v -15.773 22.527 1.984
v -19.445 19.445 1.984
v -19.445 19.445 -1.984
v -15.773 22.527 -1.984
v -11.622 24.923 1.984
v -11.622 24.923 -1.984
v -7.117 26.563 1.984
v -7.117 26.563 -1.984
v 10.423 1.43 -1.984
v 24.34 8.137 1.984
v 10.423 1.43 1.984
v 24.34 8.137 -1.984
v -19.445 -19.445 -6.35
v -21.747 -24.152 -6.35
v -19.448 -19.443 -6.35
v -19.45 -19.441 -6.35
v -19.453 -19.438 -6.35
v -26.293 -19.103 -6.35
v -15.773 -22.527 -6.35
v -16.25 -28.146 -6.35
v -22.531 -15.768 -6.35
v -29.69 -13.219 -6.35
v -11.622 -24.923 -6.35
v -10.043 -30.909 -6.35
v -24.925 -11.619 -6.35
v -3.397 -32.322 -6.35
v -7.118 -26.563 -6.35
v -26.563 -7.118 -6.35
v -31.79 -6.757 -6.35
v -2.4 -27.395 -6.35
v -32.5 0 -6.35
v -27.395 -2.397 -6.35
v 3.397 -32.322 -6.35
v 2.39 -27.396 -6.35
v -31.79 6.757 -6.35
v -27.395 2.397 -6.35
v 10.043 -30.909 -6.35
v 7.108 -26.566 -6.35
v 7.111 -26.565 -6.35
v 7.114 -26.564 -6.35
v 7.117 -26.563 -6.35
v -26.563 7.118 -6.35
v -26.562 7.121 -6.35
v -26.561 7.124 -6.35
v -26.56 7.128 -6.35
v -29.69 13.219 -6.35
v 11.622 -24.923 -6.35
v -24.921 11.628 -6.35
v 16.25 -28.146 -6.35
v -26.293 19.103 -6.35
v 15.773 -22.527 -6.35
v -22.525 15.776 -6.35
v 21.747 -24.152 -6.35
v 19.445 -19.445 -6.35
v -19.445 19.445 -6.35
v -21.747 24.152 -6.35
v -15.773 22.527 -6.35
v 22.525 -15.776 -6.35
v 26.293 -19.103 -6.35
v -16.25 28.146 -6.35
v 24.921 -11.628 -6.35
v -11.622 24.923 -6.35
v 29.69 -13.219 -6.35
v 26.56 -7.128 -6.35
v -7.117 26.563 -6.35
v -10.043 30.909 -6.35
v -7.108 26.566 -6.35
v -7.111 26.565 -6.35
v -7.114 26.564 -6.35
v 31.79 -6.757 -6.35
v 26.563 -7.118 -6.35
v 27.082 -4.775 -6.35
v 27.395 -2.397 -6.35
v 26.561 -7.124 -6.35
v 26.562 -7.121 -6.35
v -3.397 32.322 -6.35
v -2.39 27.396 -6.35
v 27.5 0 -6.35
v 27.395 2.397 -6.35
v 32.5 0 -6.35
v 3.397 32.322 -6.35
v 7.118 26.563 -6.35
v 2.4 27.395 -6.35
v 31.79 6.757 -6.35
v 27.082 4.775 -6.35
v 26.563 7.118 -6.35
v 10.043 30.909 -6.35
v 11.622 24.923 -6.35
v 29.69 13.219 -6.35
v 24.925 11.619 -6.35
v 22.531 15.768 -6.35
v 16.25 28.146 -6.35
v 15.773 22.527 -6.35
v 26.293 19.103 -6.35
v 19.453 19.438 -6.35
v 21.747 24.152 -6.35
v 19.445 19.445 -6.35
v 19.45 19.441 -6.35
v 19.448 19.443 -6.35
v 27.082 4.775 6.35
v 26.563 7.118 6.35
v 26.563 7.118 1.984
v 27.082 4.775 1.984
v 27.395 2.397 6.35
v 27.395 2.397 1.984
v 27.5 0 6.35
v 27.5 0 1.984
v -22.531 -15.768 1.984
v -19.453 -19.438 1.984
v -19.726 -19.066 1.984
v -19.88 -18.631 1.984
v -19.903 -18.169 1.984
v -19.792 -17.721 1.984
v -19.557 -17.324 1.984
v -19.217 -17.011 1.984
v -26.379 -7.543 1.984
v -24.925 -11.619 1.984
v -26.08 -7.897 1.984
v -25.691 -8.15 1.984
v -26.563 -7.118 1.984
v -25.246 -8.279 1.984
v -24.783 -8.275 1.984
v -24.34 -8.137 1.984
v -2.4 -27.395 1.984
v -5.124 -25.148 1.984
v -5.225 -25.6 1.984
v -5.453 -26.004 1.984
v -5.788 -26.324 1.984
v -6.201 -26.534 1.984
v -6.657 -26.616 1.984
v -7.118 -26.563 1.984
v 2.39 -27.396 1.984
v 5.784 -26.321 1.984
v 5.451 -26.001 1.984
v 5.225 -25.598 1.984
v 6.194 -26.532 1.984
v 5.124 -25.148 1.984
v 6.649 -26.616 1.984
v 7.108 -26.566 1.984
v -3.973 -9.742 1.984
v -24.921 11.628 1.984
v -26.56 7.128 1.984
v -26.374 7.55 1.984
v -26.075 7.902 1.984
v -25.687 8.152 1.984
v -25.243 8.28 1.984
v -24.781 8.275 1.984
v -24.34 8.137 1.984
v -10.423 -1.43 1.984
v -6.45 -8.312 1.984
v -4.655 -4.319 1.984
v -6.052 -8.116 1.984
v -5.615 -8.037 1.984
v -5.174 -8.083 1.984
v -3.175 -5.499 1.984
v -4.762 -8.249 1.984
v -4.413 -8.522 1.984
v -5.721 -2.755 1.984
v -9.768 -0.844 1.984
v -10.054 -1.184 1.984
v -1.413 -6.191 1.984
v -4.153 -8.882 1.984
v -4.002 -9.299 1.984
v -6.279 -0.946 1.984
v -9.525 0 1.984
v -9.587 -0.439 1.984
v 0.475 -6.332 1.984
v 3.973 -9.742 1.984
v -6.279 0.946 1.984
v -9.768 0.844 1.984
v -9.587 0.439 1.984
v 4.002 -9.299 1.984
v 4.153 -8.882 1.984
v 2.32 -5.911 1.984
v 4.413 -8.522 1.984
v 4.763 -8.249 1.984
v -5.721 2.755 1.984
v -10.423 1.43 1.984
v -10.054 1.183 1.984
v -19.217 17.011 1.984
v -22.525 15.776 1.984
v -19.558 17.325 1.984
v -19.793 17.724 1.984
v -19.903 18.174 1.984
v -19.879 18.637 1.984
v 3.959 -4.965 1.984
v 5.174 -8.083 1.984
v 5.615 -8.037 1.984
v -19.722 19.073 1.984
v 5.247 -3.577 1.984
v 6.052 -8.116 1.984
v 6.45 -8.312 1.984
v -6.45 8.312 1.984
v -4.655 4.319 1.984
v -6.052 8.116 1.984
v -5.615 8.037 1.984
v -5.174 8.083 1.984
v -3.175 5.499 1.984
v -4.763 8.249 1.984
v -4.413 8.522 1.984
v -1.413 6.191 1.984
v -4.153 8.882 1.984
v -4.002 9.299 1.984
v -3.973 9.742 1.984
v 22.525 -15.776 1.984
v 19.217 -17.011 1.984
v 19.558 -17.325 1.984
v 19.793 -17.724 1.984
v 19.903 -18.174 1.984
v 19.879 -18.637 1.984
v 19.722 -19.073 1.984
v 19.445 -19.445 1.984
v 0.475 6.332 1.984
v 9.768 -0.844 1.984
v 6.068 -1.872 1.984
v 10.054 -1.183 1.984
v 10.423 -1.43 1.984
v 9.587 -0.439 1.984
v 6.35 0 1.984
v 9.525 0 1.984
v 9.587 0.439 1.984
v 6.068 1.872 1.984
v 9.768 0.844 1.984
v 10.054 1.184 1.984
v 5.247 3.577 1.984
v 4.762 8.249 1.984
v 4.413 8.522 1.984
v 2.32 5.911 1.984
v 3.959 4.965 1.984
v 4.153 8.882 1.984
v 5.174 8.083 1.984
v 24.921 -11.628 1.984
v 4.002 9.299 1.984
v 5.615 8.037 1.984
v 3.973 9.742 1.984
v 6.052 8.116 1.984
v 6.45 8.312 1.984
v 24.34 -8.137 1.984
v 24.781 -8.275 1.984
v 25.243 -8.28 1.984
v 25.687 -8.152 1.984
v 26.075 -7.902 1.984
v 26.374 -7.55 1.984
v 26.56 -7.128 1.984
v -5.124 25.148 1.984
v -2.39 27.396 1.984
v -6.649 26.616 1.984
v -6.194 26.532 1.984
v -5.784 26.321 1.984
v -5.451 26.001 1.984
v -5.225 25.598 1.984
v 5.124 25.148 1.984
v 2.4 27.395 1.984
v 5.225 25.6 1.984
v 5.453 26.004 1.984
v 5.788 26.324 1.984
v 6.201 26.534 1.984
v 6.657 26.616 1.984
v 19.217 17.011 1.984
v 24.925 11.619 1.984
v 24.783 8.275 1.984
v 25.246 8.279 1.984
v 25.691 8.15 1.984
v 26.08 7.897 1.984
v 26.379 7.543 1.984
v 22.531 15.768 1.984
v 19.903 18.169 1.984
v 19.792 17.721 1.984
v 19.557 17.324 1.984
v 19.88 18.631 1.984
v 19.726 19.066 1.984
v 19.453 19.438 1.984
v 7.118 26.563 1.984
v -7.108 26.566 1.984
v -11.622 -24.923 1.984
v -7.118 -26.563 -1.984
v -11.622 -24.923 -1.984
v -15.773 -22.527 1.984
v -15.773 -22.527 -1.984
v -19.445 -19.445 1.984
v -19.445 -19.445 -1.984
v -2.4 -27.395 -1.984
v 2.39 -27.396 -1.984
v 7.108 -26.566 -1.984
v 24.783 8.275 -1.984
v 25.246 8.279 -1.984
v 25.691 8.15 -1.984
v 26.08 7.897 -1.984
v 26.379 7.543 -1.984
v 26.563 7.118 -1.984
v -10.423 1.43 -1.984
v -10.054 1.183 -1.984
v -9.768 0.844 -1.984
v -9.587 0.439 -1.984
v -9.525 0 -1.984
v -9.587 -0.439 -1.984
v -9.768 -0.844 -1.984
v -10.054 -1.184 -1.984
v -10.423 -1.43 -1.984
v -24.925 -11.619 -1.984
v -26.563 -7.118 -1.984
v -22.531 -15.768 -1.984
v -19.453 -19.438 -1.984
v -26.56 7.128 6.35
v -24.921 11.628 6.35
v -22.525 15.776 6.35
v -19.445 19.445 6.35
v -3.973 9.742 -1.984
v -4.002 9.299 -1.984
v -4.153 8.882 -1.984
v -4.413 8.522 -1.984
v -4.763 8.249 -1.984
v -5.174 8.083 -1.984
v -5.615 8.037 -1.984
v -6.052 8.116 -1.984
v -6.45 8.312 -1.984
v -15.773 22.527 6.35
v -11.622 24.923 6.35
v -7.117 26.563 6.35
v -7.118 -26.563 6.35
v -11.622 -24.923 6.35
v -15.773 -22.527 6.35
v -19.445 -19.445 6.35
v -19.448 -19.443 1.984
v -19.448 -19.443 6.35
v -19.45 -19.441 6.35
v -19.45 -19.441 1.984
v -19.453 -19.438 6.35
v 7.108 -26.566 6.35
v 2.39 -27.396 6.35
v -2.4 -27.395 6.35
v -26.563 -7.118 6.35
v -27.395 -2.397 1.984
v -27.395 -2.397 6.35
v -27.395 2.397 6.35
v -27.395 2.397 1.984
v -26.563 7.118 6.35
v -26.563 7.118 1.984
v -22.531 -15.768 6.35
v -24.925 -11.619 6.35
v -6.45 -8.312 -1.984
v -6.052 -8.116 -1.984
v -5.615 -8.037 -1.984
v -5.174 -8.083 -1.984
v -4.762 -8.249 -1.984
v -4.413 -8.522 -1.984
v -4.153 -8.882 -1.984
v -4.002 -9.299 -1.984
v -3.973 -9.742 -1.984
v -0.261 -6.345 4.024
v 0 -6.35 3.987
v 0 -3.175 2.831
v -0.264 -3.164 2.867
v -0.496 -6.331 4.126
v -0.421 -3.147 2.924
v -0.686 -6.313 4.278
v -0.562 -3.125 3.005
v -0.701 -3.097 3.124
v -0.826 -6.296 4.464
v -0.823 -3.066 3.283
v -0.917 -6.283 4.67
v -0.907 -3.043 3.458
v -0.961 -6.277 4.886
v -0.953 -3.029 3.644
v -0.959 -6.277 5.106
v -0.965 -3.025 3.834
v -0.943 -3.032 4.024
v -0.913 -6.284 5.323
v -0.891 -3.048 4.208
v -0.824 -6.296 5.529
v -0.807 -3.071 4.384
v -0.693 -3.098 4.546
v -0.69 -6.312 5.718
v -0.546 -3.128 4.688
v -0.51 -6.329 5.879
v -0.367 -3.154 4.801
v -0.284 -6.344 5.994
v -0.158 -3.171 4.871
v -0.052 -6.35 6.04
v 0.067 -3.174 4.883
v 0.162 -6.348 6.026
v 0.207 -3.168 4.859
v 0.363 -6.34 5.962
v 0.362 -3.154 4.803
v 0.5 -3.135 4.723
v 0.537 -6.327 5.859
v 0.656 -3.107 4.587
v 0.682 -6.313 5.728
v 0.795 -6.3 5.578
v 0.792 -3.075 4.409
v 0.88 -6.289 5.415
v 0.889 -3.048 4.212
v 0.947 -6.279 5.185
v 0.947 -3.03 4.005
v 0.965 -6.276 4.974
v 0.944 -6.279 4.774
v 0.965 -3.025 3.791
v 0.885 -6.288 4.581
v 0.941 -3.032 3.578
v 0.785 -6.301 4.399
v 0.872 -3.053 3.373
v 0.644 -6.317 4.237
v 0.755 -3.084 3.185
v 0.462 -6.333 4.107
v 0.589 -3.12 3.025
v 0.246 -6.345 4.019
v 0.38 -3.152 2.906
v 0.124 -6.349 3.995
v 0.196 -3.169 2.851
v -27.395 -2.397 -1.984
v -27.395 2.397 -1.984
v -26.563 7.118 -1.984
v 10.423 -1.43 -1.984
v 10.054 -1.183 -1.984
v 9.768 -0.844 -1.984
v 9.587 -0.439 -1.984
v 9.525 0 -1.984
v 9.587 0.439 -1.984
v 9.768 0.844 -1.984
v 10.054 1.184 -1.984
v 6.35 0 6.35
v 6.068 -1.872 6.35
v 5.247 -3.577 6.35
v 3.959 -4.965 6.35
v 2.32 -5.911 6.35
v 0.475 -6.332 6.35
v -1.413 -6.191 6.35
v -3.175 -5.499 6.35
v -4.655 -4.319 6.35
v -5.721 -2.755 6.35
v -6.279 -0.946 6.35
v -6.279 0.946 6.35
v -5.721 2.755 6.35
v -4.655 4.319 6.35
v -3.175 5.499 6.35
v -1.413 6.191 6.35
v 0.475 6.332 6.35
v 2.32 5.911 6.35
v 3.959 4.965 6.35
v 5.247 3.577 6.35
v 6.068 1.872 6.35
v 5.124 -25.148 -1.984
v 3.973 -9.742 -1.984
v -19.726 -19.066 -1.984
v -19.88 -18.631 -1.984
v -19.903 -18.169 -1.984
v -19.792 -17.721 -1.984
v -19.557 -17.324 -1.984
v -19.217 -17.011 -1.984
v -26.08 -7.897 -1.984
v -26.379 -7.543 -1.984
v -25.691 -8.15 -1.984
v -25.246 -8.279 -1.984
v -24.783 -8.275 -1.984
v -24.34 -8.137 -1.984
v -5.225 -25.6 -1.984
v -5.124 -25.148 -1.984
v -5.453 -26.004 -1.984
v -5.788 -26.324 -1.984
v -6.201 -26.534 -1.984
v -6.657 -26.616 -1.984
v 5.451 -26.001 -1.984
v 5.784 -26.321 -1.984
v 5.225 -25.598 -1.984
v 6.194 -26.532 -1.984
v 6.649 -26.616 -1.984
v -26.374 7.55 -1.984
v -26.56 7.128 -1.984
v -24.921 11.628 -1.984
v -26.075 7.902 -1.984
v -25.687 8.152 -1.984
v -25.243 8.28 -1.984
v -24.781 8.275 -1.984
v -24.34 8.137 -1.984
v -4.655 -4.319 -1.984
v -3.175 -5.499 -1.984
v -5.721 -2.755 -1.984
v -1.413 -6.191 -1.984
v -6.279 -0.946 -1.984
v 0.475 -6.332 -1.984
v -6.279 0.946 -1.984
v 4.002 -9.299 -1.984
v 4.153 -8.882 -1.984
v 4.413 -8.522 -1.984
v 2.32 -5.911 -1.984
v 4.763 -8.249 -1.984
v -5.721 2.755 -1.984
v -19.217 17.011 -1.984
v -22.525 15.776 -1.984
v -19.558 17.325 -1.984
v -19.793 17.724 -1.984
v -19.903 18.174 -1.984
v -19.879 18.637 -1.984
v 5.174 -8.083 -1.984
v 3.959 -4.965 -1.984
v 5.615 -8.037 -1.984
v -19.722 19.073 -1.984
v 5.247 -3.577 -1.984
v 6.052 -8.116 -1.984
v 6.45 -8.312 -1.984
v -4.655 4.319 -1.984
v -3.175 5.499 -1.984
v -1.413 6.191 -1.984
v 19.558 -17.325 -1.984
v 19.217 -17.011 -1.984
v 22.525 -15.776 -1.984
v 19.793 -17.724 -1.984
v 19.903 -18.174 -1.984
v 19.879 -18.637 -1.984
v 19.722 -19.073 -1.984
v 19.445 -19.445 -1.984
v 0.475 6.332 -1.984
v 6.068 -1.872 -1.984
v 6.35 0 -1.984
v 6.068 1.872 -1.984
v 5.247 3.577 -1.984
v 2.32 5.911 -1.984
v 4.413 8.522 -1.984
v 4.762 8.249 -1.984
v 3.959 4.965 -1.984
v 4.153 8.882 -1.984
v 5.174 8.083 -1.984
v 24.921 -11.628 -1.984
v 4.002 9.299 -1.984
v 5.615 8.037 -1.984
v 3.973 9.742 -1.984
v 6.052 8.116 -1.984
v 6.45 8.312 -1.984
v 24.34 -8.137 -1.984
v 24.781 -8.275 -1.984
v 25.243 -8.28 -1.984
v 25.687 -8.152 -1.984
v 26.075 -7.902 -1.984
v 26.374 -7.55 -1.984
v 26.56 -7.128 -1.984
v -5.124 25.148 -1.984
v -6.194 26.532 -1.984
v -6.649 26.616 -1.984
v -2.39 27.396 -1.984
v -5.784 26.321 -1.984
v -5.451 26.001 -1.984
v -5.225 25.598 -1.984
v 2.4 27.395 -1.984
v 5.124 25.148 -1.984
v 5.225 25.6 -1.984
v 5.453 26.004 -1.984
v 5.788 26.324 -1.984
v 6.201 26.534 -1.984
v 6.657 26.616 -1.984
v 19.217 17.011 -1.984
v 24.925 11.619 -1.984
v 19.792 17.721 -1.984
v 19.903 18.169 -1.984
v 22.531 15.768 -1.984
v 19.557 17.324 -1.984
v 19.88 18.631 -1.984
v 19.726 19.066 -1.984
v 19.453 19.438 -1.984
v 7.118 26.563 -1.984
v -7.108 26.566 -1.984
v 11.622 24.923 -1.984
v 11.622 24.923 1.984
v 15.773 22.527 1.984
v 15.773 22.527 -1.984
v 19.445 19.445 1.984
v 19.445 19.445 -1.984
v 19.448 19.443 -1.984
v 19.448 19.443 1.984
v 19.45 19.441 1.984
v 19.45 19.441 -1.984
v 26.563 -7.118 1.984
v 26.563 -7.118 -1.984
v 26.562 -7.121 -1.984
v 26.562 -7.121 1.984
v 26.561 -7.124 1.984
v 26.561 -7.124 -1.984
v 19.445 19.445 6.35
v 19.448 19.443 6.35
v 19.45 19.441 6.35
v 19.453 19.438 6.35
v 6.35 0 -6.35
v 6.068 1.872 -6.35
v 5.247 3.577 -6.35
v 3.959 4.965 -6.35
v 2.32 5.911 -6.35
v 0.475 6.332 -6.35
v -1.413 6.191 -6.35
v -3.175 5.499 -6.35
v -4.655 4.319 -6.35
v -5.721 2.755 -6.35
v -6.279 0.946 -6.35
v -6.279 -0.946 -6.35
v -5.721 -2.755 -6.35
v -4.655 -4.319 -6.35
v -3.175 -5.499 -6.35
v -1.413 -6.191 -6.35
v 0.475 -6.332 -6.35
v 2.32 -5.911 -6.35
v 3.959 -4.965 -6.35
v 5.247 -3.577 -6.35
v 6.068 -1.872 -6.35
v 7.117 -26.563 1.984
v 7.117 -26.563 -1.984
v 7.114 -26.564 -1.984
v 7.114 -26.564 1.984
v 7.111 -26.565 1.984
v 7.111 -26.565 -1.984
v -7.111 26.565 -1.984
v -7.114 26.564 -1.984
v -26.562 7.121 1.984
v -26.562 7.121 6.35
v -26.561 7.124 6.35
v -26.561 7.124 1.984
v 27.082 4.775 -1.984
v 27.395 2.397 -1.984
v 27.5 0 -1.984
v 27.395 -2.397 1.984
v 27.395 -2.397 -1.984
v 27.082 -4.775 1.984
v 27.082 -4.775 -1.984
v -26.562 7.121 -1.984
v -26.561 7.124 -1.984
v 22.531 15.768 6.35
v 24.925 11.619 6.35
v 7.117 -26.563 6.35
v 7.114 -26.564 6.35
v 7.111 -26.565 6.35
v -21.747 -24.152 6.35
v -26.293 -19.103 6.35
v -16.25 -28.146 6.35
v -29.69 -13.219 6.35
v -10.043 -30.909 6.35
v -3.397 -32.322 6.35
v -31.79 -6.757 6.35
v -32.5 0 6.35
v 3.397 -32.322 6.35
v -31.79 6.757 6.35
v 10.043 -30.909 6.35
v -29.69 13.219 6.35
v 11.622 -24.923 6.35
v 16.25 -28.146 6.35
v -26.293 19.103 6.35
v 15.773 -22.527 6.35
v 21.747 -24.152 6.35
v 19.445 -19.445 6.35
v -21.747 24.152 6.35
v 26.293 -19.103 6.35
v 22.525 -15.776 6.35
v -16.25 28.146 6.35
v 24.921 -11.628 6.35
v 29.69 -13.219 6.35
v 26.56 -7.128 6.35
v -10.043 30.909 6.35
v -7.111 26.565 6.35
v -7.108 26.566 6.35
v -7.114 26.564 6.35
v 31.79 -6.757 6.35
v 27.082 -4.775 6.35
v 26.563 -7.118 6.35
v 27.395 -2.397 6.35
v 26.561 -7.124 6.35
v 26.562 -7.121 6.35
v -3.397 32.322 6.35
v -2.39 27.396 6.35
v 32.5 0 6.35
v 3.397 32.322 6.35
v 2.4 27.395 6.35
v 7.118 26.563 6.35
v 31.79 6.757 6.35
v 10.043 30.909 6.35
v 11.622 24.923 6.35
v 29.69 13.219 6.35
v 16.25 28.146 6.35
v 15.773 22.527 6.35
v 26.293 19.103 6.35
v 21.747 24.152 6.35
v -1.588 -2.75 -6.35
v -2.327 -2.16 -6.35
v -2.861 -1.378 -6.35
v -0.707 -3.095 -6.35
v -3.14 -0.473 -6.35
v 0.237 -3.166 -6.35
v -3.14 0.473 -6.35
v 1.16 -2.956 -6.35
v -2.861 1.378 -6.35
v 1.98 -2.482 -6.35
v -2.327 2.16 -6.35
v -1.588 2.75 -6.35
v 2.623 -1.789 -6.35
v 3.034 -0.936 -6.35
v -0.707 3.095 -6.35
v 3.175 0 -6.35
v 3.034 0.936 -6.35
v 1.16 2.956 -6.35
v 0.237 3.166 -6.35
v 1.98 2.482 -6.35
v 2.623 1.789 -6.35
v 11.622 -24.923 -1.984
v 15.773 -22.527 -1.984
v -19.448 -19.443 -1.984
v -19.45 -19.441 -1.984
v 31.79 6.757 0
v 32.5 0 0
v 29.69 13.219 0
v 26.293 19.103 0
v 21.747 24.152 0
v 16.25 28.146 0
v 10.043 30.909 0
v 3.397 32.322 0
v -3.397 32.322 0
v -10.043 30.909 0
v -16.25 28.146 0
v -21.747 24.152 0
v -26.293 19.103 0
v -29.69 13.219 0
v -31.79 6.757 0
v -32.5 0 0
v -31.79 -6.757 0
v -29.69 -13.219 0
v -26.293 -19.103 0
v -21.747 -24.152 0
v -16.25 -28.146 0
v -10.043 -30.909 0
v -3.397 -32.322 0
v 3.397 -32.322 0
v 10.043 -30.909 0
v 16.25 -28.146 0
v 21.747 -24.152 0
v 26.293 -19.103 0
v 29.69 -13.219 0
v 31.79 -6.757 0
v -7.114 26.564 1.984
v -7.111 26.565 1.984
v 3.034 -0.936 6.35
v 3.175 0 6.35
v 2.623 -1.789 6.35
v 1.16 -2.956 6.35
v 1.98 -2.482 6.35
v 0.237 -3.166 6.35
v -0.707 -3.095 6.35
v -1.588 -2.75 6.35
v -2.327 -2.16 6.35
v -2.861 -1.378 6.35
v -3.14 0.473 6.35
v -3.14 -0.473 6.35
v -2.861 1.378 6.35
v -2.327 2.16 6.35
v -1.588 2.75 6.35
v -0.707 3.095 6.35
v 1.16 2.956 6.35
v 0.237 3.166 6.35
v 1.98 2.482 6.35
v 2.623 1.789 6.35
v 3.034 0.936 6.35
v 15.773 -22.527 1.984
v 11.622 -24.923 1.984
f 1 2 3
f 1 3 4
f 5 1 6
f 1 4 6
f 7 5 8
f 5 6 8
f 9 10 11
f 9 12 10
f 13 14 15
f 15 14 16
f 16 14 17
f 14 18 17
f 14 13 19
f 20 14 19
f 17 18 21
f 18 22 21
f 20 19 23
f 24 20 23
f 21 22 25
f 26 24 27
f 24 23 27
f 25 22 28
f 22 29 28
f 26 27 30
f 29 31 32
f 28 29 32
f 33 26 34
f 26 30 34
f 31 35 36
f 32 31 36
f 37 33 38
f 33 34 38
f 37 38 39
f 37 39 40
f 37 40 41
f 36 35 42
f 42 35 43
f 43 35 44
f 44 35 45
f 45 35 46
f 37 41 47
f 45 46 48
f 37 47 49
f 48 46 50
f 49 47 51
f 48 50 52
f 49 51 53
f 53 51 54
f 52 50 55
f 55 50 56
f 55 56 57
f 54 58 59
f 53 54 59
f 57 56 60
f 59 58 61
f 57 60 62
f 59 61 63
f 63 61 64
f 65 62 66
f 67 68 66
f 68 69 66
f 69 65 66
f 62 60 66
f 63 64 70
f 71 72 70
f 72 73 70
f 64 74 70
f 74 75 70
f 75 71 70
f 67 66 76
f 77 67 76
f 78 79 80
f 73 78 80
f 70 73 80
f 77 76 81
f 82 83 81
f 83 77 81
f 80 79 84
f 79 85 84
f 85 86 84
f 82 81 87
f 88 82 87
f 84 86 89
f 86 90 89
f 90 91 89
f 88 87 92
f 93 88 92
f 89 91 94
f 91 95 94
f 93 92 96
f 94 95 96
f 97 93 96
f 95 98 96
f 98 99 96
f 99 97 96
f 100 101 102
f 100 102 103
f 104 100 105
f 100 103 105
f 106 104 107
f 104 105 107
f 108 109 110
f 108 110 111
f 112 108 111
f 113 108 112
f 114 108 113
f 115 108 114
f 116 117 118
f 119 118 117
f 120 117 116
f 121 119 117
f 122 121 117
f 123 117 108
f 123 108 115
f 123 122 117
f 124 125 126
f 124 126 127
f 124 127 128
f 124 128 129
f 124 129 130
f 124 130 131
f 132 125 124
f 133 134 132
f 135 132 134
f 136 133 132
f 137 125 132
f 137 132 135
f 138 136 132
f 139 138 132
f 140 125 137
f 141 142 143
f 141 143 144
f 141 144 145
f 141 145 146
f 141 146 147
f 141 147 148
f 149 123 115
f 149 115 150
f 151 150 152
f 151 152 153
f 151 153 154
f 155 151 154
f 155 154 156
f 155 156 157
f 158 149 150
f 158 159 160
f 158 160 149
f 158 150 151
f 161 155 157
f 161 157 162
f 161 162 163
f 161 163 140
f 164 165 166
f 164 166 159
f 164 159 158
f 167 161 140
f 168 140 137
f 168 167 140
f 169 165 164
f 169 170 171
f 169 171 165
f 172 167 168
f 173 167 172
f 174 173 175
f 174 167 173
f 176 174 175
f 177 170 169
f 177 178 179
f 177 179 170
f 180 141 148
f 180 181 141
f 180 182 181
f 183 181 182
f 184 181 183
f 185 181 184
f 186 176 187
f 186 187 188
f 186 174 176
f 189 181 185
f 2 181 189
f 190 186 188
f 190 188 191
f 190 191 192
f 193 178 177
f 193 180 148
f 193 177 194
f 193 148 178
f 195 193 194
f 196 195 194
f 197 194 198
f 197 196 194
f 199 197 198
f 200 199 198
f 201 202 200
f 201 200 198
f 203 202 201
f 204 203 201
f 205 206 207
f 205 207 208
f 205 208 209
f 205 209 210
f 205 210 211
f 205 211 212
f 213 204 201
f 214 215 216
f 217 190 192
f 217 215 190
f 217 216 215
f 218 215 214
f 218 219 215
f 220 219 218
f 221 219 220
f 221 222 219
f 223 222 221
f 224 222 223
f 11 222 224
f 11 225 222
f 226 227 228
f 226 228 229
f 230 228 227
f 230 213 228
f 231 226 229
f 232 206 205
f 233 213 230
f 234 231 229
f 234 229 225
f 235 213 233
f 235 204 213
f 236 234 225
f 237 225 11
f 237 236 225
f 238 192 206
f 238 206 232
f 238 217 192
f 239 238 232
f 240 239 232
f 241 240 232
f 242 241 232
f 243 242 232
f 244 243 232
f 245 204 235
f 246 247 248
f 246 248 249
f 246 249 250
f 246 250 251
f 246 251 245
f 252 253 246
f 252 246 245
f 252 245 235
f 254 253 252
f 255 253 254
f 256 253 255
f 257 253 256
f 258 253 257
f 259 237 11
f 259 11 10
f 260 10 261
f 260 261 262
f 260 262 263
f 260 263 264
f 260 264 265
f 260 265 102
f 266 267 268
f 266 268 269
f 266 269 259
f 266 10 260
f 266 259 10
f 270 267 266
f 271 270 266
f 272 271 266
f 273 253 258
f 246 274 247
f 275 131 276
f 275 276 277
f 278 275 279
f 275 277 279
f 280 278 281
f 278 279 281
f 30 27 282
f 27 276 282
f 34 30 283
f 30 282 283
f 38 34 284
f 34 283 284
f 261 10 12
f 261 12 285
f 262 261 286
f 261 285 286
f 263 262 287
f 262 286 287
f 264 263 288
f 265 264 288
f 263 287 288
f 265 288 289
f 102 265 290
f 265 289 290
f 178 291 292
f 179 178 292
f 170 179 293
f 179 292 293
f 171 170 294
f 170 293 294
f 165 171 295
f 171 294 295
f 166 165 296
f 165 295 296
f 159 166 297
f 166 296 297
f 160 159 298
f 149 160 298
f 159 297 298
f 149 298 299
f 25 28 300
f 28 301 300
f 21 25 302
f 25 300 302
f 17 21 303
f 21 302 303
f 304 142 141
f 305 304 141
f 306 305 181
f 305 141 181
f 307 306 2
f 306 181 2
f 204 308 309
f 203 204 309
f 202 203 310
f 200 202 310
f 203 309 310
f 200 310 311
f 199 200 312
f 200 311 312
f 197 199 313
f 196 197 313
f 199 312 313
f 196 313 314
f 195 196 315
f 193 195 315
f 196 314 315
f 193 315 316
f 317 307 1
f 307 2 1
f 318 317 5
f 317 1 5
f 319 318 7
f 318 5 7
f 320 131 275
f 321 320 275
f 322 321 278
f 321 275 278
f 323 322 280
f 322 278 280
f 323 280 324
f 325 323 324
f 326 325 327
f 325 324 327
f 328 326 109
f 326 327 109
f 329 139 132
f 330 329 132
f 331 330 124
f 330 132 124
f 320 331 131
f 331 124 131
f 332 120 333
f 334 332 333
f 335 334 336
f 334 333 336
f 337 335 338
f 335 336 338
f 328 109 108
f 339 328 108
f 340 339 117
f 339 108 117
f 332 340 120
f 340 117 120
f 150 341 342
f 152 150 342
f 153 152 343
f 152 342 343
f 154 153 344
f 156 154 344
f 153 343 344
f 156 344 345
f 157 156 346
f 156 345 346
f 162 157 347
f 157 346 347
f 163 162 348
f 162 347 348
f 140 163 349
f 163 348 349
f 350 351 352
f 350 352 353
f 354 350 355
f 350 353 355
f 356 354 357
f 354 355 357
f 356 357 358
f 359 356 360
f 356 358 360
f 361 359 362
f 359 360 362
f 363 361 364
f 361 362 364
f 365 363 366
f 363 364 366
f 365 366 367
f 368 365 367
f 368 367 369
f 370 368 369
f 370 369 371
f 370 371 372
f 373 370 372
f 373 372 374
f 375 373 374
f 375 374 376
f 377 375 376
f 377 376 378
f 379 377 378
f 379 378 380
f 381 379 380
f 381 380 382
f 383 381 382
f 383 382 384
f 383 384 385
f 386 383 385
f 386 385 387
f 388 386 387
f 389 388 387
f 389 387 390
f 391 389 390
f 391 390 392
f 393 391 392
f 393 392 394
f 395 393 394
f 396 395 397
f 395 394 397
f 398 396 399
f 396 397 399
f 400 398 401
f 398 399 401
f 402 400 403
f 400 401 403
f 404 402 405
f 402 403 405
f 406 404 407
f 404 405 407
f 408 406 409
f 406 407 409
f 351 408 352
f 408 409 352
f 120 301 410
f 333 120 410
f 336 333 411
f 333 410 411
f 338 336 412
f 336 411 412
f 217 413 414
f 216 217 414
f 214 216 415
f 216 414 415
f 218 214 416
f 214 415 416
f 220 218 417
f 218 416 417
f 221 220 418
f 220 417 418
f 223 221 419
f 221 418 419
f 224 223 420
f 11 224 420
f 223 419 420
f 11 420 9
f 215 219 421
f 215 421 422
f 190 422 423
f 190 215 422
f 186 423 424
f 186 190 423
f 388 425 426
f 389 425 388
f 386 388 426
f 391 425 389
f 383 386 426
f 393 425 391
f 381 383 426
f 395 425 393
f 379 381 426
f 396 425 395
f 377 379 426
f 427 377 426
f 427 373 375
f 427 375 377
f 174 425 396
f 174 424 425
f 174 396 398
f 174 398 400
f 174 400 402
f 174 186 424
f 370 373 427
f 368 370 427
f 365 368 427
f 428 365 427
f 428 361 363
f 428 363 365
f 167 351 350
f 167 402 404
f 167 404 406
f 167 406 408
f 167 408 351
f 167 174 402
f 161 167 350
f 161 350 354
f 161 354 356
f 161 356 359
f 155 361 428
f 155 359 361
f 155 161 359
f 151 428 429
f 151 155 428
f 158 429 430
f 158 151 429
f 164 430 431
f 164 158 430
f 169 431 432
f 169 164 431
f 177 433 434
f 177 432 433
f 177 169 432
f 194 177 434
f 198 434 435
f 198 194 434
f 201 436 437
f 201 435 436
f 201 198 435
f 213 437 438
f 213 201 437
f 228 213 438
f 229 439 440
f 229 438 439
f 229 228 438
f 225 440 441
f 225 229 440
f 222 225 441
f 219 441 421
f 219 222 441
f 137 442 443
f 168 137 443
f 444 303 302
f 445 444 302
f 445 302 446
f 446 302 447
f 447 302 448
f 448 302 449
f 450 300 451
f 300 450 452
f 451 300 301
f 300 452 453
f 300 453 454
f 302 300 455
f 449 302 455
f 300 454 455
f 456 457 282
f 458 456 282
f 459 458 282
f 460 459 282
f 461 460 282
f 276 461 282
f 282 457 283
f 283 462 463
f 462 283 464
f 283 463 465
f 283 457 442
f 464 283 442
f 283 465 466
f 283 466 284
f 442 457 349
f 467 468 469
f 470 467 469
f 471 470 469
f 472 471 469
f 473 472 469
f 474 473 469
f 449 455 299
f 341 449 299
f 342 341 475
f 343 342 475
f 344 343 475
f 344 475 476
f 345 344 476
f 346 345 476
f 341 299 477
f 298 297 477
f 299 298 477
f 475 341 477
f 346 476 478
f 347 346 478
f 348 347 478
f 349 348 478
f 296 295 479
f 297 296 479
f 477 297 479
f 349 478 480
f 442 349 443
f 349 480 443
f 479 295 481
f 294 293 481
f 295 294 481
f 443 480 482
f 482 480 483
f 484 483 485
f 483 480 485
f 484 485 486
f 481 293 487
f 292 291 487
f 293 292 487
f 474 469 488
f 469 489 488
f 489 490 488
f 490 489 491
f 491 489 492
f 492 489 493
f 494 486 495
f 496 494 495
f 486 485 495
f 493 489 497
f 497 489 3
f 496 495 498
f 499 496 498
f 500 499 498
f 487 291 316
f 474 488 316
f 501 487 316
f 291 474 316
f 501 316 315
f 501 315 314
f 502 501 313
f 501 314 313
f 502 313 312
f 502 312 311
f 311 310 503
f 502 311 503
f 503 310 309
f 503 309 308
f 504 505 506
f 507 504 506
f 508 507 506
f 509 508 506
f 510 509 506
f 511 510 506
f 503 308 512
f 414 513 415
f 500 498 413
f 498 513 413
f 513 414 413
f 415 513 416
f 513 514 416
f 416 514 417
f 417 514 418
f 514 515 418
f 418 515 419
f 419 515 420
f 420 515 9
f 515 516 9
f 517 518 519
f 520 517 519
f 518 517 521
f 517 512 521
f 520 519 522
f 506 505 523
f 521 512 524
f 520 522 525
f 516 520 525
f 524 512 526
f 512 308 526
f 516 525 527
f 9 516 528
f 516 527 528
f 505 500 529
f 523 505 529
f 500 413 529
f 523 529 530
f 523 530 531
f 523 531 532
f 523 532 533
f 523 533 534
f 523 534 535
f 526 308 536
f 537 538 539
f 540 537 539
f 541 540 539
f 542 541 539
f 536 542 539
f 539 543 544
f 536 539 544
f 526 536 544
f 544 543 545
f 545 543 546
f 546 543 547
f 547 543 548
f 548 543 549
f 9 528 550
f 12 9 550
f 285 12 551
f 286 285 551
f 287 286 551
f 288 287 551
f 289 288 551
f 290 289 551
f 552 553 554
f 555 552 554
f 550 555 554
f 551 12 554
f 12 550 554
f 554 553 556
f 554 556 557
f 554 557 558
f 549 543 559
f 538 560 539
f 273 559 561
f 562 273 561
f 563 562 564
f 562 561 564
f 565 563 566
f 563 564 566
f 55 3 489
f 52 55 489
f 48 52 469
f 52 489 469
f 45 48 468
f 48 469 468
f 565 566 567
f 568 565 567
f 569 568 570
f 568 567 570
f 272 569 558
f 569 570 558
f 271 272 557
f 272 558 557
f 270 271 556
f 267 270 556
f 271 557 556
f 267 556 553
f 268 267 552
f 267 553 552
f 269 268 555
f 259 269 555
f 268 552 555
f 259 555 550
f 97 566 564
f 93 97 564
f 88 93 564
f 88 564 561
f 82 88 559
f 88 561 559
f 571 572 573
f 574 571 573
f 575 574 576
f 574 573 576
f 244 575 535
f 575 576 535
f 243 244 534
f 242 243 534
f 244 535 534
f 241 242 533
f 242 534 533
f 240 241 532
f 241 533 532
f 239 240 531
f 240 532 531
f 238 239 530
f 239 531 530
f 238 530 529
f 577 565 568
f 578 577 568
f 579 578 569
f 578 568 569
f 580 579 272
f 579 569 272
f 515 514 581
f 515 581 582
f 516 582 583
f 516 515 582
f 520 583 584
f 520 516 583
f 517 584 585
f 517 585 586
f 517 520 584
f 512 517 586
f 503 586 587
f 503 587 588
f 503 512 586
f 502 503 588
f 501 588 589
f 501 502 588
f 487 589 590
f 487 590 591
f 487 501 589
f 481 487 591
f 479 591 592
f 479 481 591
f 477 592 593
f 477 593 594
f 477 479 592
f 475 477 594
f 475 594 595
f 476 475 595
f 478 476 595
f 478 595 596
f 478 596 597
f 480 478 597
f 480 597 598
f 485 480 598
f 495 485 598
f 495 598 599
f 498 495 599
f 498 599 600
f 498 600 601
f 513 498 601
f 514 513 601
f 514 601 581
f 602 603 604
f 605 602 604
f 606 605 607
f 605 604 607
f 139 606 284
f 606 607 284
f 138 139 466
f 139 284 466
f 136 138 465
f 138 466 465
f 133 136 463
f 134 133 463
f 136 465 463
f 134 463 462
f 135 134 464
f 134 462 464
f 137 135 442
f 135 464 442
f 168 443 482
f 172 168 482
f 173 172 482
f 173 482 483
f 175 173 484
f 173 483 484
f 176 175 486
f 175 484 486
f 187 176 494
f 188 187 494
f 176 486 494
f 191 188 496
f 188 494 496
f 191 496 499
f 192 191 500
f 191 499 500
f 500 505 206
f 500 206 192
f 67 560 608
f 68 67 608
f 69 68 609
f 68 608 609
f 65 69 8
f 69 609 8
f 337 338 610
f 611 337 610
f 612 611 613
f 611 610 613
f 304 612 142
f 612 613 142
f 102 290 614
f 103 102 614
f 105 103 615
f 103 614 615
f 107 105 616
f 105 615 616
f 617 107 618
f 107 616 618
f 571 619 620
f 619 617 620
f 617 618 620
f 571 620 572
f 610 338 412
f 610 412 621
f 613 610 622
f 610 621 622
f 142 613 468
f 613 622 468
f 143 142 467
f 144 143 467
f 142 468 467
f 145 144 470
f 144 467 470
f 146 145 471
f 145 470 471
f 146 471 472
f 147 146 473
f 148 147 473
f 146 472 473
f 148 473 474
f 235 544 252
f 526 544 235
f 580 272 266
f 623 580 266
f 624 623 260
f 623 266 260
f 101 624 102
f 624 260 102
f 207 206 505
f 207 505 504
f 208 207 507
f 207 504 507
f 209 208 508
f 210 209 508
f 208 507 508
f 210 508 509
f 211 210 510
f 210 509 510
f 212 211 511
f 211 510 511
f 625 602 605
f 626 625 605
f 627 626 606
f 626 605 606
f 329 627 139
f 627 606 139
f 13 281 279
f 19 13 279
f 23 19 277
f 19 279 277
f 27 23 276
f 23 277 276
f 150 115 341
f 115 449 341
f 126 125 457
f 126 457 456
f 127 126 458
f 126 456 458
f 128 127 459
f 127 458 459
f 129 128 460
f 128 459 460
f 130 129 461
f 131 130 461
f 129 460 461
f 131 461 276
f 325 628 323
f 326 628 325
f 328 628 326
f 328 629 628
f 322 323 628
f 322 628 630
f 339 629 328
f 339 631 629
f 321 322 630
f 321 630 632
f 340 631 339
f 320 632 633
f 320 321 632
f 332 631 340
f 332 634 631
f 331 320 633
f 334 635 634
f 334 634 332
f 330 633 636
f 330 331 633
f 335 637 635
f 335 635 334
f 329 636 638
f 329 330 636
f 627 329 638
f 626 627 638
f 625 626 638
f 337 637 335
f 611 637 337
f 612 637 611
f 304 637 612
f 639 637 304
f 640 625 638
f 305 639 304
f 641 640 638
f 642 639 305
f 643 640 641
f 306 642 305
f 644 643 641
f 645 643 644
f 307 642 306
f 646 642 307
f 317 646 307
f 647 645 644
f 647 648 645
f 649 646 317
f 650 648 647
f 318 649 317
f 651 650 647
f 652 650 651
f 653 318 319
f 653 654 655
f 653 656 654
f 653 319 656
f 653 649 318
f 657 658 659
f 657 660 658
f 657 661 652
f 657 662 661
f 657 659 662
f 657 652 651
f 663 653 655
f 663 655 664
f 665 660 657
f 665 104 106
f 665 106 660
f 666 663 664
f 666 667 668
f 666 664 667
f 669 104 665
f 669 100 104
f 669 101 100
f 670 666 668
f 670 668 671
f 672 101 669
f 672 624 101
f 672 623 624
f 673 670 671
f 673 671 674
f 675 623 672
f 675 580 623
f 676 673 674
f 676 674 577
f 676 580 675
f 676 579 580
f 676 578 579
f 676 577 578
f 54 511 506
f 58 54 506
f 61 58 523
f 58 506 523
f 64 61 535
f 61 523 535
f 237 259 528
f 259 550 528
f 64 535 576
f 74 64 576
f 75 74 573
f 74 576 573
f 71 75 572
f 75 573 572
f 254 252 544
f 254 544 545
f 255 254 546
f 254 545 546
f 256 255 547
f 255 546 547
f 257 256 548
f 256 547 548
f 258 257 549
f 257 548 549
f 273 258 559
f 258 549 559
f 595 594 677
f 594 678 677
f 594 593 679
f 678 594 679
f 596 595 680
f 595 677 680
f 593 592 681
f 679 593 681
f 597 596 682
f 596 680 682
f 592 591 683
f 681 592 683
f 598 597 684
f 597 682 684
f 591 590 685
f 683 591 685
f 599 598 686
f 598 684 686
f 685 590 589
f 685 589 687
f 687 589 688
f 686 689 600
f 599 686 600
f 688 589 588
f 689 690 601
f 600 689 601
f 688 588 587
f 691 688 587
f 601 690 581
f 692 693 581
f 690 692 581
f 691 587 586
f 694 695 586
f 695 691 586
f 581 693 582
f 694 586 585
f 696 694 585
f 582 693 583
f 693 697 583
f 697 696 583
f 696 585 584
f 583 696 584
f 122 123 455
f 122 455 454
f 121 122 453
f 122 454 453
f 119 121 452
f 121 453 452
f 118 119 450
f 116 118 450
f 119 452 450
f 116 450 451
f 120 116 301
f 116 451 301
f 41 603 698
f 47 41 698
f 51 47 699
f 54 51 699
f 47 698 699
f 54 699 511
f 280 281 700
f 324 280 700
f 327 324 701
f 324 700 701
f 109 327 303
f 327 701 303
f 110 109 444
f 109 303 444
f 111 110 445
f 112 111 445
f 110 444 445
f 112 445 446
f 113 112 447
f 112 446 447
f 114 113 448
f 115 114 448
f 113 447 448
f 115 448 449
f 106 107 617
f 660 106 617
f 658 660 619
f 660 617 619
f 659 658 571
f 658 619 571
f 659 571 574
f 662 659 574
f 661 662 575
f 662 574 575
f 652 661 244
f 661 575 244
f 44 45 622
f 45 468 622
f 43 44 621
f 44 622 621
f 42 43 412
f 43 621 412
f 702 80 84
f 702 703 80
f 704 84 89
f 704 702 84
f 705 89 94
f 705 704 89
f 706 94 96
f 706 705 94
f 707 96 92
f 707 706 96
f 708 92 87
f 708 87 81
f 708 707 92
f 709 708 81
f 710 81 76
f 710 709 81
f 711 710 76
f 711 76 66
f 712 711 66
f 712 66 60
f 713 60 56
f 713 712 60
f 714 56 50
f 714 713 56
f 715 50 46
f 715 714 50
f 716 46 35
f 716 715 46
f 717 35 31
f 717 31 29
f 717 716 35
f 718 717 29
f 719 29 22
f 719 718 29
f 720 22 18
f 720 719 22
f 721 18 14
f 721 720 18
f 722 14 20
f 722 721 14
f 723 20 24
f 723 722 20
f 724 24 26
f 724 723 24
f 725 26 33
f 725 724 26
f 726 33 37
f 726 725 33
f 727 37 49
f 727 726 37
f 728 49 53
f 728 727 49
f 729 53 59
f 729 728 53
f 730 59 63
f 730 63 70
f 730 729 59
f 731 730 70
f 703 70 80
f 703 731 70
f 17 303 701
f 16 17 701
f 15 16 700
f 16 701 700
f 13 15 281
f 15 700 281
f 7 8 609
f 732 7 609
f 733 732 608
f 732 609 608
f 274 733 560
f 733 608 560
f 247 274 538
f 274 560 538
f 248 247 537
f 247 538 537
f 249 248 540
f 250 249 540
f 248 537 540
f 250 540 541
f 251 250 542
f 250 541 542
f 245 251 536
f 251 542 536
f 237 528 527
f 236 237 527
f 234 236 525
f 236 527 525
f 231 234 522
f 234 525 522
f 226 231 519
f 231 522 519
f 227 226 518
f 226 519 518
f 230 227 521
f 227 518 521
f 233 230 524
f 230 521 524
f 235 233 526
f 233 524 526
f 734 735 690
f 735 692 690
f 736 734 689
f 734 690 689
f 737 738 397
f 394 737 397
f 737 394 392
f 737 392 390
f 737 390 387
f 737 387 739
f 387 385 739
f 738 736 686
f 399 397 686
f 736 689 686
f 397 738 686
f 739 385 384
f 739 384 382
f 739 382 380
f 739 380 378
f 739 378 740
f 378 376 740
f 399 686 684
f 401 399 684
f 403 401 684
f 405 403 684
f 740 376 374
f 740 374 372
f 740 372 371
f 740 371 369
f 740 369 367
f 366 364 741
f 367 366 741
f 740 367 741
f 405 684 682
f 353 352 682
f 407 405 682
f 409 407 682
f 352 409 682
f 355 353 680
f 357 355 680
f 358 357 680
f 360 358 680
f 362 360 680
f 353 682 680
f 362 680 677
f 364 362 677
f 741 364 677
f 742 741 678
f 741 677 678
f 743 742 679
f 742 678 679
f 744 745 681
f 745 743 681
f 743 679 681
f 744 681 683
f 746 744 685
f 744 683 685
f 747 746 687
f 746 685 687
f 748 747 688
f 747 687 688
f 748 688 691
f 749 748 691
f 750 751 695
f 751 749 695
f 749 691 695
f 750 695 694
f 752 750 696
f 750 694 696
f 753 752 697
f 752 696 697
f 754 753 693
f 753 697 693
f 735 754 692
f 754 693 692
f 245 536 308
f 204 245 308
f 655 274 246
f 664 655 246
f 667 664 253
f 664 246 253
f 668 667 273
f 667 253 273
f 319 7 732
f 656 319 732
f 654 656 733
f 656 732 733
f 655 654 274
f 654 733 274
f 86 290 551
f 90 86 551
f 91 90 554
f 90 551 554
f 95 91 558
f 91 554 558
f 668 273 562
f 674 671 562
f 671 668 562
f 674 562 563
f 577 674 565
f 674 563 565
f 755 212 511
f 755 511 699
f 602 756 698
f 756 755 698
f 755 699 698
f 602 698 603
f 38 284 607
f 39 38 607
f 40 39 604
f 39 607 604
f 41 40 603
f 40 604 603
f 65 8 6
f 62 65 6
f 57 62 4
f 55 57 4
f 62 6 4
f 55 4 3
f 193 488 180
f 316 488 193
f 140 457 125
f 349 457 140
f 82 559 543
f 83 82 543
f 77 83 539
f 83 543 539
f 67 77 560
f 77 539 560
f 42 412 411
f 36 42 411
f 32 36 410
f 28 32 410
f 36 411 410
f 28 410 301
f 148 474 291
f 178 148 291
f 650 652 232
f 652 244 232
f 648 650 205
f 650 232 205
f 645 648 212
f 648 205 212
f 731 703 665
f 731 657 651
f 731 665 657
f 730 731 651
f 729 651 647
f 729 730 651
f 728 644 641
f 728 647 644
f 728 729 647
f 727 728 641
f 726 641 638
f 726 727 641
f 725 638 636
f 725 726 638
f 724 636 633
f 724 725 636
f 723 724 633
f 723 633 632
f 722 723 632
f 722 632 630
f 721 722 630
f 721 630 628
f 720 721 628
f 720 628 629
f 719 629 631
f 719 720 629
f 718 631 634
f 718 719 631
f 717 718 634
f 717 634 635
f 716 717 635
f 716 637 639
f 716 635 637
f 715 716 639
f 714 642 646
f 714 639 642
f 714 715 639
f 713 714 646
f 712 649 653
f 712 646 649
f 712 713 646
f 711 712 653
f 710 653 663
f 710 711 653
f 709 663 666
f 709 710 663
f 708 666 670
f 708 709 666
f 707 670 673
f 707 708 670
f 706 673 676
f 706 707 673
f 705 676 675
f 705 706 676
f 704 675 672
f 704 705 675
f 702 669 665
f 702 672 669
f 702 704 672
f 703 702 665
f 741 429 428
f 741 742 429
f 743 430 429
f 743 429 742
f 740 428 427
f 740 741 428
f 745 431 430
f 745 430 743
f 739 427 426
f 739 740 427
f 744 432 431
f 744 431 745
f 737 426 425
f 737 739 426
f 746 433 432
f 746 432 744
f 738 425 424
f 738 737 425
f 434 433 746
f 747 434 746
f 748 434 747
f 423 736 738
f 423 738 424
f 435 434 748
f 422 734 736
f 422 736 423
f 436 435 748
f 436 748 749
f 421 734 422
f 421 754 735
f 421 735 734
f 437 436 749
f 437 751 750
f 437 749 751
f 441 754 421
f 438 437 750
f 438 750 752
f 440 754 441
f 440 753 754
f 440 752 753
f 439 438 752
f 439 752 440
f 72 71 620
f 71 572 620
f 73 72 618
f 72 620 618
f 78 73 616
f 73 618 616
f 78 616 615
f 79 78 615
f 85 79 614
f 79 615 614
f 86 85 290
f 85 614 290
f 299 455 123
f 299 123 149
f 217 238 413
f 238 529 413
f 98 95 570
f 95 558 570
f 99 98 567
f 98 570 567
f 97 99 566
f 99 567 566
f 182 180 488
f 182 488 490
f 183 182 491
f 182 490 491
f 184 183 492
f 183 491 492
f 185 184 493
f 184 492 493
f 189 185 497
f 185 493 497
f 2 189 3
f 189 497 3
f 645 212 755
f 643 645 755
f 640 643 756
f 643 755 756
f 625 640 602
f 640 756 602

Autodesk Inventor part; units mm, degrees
ref_plane "YZ Plane (RIGHT)" through (0, 0, 0) normal (1, 0, 0) x (0, 1, 0)
ref_plane "XY Plane (FRONT)" through (0, 0, 0) normal (0, 0, 1) x (1, 0, 0)
sketch "Sketch2" plane through (0, 0, 0) normal (0, 0, 1) x (1, 0, 0)
  circle A0 centre (0, 0) radius 3.175
  circle A1 centre (0, 0) radius 6.35
  dimension "d0" = 6.35
  dimension "d1" = 12.7
extrude "Extrusion1" add sketch "Sketch2" along normal mid plane 12.7
sketch "Sketch3" plane through (0, 0, 0) normal (0, 0, 1) x (1, 0, 0)
  circle A0 centre (0, 0) radius 27.5
  circle A1 centre (0, 0) radius 3.175 projected
  circle A2 centre (0, 0) radius 6.35
  circle A3 centre (0, 0) radius 6.35 projected
  dimension "d4" = 55
extrude "Extrusion2" add sketch "Sketch3" along normal mid plane 3.9688 contours A0
sketch "Sketch4" plane through (0, 0, 0) normal (0, 0, 1) x (1, 0, 0)
  circle A0 centre (0, 0) radius 3.175 projected
  circle A1 centre (0, 0) radius 32.5
  circle A2 centre (0, 0) radius 27.5
  circle A3 centre (0, 0) radius 27.5 projected
  dimension "d7" = 65
extrude "Extrusion3" add sketch "Sketch4" along normal mid plane 12.7 contours A1
sketch "Sketch7" plane through (0, 0, 1.9844) normal (0, 0, 1) x (1, 0, 0)
  circle A0 centre (0, 0) radius 3.175 construction
  line L0 (0, 0) -> (-6.7066, 25.0296) construction
  arc A1 (-5.1236, 25.1478) -> (-7.1175, 26.563) centre (-6.7066, 25.0296) ccw
  circle A2 centre (0, 0) radius 27.5 projected
  line L1 (0, 0) -> (0, 17.8508) construction
  arc A3 (-6.8709, 8.7338) -> (-3.9732, 9.7419) centre (-5.5563, 9.6237) ccw
  line L2 (0, 0) -> (-5.5563, 9.6237) construction
  circle A4 centre (0, 0) radius 11.1125 construction
  arc A5 (-19.4454, 19.4454) -> (-19.2168, 17.011) centre (-18.3229, 18.3229) ccw
  line L3 (-18.3229, 18.3229) -> (0, 0) construction
  line L4 (-19.2168, 17.011) -> (-6.4502, 8.3118)
  line L5 (-5.1236, 25.1478) -> (-3.9732, 9.7419)
  arc A6 (-7.1175, 26.563) -> (-19.4454, 19.4454) centre (0, 0) ccw
  dimension "d17" = 3.175
  dimension "d18" = 15
  dimension "d19" = 30
  dimension "d20" = 22.225
  dimension "d21" = 30
extrude "Extrusion4" cut sketch "Sketch7" along normal through all both and the other way through all contours L5 A3 L4 A5 A2 A1 picked at (-13.8134, 15.9498)
pattern_circular "Circular Pattern1" count 6 over 360 about axis through (0, 0, 0) along (0, 0, 1) of "Extrusion4"
ref_plane "Work Plane1" through (0, -6.35, 0) normal (0, 1, 0) x (-1, 0, 0)
sketch "Sketch8" plane through (0, -6.35, 0) normal (0, 1, 0) x (-1, 0, 0)
  line L0 (-16.7863, 6.35) -> (14.809, 6.35) construction
  point P0 (0, 0)
  dimension "d27" = 6.35
ref_plane "Work Plane2" through (16.7863, -6.35, 6.35) normal (0, -0.9397, 0.342) x (1, 0, 0)
sketch "Sketch9" plane through (16.7863, -6.35, 6.35) normal (0, -0.9397, 0.342) x (1, 0, 0)
  point P0 (-16.7863, -3.7952)
  point P1 (-16.7863, -1.2552)
  dimension "d29" = 2.54
hole "Hole1" at (0, -6.7793, 5.1705) direction (0, 0.9397, -0.342) diameter 1.9304 depth 7.62 tip angle 118
properties part number "flywheel"
